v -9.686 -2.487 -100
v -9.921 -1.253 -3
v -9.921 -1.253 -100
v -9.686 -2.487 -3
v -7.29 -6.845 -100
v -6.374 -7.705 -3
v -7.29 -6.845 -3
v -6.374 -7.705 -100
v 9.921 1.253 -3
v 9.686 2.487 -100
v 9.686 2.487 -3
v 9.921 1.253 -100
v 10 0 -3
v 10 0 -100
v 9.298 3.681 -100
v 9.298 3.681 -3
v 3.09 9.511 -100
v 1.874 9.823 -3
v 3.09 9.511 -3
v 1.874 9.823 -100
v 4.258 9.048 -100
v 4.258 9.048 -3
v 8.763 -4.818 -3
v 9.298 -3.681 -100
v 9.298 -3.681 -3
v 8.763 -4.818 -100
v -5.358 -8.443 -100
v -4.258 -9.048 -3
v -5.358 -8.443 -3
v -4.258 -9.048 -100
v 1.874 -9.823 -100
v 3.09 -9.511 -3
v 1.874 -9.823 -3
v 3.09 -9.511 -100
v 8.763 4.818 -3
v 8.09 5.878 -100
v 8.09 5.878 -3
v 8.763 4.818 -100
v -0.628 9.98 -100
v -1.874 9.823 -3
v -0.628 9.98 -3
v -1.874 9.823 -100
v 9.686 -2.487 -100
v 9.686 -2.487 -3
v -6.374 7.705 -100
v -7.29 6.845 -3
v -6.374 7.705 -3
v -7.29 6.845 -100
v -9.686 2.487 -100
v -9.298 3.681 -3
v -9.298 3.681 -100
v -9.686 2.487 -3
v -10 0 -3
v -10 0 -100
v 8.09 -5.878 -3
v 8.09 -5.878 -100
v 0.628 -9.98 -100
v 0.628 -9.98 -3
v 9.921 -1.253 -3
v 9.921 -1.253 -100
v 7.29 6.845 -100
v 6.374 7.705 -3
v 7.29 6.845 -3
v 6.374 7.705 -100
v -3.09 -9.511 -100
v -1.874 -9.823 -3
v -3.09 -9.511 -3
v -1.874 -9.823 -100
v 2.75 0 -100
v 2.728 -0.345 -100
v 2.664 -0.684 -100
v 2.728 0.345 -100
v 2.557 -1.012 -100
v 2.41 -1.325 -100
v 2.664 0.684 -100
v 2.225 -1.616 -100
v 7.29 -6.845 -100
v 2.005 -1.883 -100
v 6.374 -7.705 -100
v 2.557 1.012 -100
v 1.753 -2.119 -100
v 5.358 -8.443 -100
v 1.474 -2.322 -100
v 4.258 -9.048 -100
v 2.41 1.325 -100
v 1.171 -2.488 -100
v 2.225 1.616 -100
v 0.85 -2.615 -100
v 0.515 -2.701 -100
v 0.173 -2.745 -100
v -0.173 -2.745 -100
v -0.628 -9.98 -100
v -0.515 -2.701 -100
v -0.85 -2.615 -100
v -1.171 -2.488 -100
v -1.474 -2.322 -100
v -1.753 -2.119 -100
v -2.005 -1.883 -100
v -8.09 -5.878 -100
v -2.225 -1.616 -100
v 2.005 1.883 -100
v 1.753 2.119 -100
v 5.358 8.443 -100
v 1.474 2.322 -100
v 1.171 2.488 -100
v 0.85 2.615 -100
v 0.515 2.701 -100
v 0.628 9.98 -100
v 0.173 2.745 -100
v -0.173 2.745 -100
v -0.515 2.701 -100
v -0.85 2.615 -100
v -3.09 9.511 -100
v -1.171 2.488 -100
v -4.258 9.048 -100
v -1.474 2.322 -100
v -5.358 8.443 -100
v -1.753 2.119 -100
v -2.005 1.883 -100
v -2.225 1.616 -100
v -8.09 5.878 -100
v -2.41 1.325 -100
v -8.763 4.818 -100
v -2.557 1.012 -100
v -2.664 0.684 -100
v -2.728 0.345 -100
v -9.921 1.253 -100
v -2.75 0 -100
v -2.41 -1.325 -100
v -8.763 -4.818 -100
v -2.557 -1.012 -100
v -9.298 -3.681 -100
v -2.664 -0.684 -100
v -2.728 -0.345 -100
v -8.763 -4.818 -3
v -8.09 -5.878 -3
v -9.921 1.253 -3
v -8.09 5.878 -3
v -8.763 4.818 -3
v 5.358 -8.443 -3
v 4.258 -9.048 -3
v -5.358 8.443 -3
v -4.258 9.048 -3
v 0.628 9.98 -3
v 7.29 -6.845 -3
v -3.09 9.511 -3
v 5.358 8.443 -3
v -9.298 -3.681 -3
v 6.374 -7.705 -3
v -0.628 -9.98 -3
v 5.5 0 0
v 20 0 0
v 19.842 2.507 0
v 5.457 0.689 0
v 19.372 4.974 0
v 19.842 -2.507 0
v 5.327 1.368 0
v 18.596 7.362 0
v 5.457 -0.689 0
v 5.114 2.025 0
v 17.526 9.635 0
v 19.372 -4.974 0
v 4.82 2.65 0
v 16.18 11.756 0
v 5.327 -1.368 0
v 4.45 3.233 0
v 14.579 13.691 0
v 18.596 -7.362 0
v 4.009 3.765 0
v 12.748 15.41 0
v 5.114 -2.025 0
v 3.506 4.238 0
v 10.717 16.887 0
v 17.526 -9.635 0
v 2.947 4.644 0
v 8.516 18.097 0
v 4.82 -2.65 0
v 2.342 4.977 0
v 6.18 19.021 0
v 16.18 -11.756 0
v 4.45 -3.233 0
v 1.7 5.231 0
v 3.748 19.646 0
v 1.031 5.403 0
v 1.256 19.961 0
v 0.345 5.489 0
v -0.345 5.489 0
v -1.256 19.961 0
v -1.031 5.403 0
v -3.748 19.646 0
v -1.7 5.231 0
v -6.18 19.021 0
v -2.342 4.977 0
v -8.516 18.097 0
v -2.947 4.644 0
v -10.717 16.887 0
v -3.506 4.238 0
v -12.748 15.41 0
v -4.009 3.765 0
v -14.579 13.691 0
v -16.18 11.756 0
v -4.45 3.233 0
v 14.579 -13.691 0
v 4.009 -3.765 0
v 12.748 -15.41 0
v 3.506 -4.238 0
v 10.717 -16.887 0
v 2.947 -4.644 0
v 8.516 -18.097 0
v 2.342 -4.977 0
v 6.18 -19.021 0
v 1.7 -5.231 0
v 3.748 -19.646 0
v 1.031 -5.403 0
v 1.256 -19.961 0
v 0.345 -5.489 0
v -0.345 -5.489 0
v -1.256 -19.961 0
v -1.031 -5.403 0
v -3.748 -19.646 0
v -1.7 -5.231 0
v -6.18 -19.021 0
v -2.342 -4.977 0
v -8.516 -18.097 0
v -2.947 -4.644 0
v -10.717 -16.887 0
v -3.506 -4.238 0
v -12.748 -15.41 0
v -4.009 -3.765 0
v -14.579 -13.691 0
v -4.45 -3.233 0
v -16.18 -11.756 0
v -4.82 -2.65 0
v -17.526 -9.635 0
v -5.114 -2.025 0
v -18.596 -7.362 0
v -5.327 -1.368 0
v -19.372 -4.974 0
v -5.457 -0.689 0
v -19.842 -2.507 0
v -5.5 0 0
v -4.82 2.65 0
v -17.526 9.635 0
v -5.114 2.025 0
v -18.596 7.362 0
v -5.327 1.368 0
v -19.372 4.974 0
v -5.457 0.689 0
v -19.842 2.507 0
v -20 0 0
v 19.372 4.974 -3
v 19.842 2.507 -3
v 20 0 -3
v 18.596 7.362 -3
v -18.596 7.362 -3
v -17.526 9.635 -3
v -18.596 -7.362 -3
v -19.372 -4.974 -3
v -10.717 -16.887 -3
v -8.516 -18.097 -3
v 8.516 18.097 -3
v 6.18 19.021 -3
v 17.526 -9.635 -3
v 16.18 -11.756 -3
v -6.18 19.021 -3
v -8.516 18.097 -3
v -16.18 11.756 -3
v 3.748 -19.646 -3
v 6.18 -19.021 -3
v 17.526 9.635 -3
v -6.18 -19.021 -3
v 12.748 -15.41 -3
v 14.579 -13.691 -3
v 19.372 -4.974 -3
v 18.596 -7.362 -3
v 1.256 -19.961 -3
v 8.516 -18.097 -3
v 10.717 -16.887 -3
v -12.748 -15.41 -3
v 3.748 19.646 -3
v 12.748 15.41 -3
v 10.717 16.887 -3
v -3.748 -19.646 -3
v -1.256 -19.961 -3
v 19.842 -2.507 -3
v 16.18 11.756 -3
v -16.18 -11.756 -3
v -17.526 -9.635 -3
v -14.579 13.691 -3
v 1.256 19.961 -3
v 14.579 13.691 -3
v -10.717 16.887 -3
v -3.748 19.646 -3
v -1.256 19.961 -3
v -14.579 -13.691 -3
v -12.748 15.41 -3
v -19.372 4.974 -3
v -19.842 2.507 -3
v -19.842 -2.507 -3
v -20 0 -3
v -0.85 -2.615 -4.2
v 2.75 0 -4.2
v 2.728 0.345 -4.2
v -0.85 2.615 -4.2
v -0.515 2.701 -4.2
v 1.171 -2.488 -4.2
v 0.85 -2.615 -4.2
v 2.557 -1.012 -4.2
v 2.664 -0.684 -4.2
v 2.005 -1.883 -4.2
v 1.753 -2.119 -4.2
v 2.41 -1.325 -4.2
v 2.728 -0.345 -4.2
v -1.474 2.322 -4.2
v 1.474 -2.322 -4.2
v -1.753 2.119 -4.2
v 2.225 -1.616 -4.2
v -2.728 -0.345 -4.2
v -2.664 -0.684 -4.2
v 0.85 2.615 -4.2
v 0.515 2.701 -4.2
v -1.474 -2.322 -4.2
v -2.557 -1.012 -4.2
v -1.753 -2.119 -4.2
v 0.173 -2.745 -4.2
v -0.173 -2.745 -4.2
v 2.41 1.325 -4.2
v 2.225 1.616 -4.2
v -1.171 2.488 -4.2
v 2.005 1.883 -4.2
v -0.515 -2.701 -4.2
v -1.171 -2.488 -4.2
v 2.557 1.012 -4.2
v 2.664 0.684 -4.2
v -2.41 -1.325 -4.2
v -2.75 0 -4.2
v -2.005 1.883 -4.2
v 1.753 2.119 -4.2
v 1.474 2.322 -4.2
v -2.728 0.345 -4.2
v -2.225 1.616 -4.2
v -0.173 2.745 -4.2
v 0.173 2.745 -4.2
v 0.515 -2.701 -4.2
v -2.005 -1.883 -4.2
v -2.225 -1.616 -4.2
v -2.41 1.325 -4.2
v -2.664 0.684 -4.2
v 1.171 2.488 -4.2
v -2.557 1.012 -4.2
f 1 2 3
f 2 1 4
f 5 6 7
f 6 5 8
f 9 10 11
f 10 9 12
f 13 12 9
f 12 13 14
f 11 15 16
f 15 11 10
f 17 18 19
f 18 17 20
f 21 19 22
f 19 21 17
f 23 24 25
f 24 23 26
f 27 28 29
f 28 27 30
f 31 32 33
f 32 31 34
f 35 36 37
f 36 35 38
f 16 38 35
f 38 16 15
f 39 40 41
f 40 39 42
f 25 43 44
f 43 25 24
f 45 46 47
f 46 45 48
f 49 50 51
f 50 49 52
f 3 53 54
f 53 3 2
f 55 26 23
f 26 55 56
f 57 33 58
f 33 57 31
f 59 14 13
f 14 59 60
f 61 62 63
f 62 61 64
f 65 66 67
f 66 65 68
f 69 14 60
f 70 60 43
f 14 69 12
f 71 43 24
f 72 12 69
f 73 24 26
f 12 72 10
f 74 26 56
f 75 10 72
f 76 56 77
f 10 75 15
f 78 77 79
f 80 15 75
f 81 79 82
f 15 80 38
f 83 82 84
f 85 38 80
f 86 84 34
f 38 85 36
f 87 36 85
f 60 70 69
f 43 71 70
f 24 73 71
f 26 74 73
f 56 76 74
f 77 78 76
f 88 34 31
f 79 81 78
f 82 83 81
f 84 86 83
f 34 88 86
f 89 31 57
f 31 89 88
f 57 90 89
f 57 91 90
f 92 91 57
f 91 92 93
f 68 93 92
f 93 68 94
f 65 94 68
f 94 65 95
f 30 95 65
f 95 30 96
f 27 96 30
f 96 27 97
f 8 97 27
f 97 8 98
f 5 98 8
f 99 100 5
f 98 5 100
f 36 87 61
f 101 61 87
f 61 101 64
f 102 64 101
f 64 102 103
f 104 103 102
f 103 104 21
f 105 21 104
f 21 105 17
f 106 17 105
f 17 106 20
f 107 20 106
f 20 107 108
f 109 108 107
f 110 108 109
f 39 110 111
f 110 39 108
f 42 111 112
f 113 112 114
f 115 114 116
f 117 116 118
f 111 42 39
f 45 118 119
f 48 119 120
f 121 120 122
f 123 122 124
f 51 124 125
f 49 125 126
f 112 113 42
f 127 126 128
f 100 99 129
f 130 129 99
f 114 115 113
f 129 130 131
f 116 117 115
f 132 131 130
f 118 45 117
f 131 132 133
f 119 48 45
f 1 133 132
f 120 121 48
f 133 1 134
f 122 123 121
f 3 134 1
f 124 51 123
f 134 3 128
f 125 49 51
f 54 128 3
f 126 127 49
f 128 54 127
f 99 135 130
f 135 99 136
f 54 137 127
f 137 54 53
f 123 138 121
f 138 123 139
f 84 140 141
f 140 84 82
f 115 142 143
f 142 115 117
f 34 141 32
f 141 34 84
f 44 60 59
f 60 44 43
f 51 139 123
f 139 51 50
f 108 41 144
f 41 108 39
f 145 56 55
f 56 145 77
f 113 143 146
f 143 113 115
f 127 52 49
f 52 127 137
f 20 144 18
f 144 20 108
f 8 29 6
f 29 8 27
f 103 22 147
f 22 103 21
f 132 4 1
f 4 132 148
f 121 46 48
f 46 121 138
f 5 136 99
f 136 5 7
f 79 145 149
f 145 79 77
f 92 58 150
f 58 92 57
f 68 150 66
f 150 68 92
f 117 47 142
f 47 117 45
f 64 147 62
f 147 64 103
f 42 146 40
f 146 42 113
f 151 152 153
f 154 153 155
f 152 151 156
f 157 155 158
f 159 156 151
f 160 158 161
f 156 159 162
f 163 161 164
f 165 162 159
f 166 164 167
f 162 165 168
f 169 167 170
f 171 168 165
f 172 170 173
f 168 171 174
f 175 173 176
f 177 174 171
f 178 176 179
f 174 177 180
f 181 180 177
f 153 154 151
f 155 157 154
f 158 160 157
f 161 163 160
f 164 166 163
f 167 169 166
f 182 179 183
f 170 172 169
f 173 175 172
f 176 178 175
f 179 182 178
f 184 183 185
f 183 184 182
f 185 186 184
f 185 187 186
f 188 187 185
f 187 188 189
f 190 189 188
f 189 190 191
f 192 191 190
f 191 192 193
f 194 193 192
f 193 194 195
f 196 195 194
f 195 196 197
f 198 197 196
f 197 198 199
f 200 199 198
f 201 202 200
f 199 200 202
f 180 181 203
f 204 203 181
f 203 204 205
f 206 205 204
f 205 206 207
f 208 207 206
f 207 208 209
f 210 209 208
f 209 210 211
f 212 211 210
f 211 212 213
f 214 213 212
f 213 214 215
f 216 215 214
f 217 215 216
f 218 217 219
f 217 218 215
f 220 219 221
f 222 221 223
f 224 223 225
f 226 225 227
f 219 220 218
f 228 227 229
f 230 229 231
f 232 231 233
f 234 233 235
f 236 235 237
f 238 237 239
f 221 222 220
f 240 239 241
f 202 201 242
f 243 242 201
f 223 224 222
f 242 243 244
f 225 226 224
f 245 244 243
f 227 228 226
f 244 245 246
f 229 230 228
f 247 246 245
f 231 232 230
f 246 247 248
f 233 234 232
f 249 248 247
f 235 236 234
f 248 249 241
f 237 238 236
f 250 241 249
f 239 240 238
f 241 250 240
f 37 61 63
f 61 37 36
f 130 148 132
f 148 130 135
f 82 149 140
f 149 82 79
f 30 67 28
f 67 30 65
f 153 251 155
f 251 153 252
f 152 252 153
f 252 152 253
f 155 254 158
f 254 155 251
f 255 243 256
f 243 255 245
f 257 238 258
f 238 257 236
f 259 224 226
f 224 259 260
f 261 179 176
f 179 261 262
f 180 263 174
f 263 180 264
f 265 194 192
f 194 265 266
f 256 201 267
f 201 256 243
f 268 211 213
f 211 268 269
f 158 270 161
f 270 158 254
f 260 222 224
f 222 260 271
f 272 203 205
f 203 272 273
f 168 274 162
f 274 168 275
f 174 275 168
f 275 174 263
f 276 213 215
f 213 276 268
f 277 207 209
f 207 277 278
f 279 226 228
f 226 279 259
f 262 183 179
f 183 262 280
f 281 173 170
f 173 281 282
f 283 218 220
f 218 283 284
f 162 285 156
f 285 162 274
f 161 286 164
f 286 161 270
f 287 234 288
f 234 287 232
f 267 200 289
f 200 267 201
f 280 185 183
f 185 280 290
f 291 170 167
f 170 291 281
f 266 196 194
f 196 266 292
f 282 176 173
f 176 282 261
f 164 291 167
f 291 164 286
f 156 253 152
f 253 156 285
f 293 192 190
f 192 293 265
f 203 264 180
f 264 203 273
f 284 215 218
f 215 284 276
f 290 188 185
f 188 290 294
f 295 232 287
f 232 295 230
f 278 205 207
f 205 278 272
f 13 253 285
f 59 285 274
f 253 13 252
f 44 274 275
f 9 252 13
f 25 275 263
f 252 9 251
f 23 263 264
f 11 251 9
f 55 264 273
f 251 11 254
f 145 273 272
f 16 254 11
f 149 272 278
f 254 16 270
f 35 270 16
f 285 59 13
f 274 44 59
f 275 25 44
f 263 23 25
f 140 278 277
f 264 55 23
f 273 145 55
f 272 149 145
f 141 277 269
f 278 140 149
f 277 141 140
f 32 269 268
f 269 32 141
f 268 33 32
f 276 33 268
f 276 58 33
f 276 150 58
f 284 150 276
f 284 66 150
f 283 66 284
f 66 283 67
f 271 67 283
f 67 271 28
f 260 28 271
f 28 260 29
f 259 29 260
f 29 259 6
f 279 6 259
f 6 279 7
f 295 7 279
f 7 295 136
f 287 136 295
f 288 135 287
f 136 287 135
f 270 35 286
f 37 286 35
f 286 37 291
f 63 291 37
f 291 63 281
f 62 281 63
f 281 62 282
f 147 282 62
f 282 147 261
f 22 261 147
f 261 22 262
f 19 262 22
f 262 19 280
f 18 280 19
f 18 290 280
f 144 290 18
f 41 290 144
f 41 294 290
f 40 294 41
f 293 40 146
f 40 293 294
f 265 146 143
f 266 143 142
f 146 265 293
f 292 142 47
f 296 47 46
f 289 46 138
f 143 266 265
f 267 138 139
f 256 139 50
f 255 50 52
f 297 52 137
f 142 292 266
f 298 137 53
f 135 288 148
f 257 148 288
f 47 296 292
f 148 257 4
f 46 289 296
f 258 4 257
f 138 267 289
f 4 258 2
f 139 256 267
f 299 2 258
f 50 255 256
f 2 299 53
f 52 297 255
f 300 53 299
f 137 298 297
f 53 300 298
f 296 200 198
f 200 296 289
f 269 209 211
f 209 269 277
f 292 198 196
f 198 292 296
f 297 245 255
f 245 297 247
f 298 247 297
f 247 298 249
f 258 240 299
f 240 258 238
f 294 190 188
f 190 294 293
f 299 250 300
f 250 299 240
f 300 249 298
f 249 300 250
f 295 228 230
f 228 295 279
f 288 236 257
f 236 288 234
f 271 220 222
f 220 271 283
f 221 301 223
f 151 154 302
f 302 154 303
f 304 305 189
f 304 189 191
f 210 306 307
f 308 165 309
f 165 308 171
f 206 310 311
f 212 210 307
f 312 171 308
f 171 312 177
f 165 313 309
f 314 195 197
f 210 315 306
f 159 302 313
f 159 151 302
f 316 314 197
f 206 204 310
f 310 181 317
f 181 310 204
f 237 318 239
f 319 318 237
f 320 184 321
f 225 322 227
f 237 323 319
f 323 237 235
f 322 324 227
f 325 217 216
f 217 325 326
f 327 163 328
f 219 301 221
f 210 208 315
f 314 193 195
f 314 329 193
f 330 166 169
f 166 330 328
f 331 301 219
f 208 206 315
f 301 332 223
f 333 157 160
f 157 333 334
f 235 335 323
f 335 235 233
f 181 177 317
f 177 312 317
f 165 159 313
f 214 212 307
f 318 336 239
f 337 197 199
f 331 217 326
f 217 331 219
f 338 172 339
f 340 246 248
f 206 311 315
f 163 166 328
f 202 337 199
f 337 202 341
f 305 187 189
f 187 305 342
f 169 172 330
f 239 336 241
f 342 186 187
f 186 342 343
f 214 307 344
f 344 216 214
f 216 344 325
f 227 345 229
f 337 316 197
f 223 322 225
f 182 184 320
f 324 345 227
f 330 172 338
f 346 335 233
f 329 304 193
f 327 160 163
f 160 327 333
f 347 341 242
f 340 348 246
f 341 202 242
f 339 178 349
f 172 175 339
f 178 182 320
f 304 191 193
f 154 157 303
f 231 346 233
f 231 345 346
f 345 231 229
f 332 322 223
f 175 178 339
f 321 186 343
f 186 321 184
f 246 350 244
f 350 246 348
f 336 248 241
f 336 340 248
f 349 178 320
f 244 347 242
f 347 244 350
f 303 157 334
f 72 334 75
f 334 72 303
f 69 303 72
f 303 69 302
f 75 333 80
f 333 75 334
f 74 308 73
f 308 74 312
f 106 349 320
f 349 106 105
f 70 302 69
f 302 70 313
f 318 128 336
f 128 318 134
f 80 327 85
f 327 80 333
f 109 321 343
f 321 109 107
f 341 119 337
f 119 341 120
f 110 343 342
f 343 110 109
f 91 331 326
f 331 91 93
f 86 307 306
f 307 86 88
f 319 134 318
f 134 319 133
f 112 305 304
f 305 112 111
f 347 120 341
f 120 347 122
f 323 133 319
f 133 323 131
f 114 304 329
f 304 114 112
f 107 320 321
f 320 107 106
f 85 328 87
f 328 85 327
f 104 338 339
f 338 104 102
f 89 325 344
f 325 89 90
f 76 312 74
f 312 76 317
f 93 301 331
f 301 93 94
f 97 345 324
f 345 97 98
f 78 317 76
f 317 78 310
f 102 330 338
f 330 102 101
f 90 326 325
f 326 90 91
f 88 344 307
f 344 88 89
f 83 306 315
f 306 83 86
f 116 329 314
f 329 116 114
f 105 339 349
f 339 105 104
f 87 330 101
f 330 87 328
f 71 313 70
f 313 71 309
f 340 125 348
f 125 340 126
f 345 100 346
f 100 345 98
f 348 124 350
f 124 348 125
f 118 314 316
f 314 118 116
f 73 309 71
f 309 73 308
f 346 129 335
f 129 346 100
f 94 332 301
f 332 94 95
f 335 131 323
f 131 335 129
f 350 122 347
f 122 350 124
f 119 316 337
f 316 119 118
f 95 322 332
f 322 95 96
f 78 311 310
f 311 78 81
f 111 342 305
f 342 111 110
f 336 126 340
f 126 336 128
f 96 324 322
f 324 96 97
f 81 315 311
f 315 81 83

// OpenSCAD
$fn = 50;


difference() {
	union() {
		translate(v = [0, 0, -100.0000000000]) {
			cylinder(h = 100, r = 10.0000000000);
		}
		translate(v = [0, 0, -3.0000000000]) {
			cylinder(h = 3, r = 20.0000000000);
		}
	}
	union() {
		translate(v = [0, 0, 0]) {
			rotate(a = [0, 0, 0]) {
				difference() {
					union() {
						#translate(v = [0, 0, -100.0000000000]) {
							cylinder(h = 100, r = 2.2500000000);
						}
						#translate(v = [0, 0, -4.2000000000]) {
							cylinder(h = 4.2000000000, r1 = 2.7500000000, r2 = 5.5000000000);
						}
						#translate(v = [0, 0, -100.0000000000]) {
							cylinder(h = 100, r = 2.7500000000);
						}
						#translate(v = [0, 0, -100.0000000000]) {
							cylinder(h = 100, r = 2.2500000000);
						}
					}
					union();
				}
			}
		}
	}
}
